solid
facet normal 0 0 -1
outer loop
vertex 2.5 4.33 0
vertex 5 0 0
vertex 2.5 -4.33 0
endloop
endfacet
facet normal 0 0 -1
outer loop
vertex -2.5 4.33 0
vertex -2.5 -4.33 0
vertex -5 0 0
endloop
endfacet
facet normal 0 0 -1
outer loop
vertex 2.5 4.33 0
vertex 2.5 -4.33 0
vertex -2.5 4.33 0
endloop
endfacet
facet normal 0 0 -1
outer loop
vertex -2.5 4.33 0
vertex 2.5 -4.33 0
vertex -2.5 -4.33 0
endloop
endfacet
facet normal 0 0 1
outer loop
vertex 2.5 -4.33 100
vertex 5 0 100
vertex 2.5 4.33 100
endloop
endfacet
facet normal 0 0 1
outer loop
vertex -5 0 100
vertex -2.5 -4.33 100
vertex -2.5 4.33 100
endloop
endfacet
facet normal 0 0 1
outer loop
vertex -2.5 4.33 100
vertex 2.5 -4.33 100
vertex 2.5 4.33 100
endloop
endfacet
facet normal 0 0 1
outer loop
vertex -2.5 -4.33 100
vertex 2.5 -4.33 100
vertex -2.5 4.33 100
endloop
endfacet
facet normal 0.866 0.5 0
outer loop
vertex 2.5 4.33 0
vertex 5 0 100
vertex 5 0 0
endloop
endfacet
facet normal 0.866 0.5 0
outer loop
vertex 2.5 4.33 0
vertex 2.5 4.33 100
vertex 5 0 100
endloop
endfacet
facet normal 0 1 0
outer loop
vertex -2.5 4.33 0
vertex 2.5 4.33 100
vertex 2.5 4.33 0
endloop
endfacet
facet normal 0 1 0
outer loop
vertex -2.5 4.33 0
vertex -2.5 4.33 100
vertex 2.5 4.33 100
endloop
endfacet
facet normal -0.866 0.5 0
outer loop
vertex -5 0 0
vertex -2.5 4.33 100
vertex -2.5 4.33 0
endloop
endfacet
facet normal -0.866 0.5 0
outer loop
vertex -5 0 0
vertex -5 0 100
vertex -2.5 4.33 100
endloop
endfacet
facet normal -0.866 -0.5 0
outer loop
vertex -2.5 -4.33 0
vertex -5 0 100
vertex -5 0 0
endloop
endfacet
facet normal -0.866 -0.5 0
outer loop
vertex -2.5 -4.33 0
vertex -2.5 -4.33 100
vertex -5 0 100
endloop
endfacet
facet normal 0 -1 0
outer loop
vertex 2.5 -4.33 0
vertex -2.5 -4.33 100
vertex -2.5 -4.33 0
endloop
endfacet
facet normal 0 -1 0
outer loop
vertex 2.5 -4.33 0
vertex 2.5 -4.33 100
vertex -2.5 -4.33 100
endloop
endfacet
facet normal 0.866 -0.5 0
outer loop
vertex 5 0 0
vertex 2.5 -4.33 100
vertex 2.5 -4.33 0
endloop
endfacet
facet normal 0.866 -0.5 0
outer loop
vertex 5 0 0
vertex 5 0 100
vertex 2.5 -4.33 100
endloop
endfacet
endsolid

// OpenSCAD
pencil(length=10,eraserl=5,tipl=4);

module pencil(length=8,eraserl=3,tipl=4){
    union(){
        pencil_eraser(length=eraserl);
        pencil_shaft(length=length);
        pencil_tip(length=tipl);
        }
    
    }

module pencil_eraser(length=4){
    
    }
module pencil_shaft(length=4){
    linear_extrude(height=100){
        circle(r=5, $fn=6);
    }
    }
module pencil_tip(length=4){
    
    }

//Simple Pencil
//translate([0,0,100]){
//  cylinder(10,5,5);
//}
//hull(){
//  linear_extrude(h=20){
//    circle(r=5, $fn=6);
//  }
//  translate([0,0,-10]){
//    sphere(r=0.3);
//  }
//}
